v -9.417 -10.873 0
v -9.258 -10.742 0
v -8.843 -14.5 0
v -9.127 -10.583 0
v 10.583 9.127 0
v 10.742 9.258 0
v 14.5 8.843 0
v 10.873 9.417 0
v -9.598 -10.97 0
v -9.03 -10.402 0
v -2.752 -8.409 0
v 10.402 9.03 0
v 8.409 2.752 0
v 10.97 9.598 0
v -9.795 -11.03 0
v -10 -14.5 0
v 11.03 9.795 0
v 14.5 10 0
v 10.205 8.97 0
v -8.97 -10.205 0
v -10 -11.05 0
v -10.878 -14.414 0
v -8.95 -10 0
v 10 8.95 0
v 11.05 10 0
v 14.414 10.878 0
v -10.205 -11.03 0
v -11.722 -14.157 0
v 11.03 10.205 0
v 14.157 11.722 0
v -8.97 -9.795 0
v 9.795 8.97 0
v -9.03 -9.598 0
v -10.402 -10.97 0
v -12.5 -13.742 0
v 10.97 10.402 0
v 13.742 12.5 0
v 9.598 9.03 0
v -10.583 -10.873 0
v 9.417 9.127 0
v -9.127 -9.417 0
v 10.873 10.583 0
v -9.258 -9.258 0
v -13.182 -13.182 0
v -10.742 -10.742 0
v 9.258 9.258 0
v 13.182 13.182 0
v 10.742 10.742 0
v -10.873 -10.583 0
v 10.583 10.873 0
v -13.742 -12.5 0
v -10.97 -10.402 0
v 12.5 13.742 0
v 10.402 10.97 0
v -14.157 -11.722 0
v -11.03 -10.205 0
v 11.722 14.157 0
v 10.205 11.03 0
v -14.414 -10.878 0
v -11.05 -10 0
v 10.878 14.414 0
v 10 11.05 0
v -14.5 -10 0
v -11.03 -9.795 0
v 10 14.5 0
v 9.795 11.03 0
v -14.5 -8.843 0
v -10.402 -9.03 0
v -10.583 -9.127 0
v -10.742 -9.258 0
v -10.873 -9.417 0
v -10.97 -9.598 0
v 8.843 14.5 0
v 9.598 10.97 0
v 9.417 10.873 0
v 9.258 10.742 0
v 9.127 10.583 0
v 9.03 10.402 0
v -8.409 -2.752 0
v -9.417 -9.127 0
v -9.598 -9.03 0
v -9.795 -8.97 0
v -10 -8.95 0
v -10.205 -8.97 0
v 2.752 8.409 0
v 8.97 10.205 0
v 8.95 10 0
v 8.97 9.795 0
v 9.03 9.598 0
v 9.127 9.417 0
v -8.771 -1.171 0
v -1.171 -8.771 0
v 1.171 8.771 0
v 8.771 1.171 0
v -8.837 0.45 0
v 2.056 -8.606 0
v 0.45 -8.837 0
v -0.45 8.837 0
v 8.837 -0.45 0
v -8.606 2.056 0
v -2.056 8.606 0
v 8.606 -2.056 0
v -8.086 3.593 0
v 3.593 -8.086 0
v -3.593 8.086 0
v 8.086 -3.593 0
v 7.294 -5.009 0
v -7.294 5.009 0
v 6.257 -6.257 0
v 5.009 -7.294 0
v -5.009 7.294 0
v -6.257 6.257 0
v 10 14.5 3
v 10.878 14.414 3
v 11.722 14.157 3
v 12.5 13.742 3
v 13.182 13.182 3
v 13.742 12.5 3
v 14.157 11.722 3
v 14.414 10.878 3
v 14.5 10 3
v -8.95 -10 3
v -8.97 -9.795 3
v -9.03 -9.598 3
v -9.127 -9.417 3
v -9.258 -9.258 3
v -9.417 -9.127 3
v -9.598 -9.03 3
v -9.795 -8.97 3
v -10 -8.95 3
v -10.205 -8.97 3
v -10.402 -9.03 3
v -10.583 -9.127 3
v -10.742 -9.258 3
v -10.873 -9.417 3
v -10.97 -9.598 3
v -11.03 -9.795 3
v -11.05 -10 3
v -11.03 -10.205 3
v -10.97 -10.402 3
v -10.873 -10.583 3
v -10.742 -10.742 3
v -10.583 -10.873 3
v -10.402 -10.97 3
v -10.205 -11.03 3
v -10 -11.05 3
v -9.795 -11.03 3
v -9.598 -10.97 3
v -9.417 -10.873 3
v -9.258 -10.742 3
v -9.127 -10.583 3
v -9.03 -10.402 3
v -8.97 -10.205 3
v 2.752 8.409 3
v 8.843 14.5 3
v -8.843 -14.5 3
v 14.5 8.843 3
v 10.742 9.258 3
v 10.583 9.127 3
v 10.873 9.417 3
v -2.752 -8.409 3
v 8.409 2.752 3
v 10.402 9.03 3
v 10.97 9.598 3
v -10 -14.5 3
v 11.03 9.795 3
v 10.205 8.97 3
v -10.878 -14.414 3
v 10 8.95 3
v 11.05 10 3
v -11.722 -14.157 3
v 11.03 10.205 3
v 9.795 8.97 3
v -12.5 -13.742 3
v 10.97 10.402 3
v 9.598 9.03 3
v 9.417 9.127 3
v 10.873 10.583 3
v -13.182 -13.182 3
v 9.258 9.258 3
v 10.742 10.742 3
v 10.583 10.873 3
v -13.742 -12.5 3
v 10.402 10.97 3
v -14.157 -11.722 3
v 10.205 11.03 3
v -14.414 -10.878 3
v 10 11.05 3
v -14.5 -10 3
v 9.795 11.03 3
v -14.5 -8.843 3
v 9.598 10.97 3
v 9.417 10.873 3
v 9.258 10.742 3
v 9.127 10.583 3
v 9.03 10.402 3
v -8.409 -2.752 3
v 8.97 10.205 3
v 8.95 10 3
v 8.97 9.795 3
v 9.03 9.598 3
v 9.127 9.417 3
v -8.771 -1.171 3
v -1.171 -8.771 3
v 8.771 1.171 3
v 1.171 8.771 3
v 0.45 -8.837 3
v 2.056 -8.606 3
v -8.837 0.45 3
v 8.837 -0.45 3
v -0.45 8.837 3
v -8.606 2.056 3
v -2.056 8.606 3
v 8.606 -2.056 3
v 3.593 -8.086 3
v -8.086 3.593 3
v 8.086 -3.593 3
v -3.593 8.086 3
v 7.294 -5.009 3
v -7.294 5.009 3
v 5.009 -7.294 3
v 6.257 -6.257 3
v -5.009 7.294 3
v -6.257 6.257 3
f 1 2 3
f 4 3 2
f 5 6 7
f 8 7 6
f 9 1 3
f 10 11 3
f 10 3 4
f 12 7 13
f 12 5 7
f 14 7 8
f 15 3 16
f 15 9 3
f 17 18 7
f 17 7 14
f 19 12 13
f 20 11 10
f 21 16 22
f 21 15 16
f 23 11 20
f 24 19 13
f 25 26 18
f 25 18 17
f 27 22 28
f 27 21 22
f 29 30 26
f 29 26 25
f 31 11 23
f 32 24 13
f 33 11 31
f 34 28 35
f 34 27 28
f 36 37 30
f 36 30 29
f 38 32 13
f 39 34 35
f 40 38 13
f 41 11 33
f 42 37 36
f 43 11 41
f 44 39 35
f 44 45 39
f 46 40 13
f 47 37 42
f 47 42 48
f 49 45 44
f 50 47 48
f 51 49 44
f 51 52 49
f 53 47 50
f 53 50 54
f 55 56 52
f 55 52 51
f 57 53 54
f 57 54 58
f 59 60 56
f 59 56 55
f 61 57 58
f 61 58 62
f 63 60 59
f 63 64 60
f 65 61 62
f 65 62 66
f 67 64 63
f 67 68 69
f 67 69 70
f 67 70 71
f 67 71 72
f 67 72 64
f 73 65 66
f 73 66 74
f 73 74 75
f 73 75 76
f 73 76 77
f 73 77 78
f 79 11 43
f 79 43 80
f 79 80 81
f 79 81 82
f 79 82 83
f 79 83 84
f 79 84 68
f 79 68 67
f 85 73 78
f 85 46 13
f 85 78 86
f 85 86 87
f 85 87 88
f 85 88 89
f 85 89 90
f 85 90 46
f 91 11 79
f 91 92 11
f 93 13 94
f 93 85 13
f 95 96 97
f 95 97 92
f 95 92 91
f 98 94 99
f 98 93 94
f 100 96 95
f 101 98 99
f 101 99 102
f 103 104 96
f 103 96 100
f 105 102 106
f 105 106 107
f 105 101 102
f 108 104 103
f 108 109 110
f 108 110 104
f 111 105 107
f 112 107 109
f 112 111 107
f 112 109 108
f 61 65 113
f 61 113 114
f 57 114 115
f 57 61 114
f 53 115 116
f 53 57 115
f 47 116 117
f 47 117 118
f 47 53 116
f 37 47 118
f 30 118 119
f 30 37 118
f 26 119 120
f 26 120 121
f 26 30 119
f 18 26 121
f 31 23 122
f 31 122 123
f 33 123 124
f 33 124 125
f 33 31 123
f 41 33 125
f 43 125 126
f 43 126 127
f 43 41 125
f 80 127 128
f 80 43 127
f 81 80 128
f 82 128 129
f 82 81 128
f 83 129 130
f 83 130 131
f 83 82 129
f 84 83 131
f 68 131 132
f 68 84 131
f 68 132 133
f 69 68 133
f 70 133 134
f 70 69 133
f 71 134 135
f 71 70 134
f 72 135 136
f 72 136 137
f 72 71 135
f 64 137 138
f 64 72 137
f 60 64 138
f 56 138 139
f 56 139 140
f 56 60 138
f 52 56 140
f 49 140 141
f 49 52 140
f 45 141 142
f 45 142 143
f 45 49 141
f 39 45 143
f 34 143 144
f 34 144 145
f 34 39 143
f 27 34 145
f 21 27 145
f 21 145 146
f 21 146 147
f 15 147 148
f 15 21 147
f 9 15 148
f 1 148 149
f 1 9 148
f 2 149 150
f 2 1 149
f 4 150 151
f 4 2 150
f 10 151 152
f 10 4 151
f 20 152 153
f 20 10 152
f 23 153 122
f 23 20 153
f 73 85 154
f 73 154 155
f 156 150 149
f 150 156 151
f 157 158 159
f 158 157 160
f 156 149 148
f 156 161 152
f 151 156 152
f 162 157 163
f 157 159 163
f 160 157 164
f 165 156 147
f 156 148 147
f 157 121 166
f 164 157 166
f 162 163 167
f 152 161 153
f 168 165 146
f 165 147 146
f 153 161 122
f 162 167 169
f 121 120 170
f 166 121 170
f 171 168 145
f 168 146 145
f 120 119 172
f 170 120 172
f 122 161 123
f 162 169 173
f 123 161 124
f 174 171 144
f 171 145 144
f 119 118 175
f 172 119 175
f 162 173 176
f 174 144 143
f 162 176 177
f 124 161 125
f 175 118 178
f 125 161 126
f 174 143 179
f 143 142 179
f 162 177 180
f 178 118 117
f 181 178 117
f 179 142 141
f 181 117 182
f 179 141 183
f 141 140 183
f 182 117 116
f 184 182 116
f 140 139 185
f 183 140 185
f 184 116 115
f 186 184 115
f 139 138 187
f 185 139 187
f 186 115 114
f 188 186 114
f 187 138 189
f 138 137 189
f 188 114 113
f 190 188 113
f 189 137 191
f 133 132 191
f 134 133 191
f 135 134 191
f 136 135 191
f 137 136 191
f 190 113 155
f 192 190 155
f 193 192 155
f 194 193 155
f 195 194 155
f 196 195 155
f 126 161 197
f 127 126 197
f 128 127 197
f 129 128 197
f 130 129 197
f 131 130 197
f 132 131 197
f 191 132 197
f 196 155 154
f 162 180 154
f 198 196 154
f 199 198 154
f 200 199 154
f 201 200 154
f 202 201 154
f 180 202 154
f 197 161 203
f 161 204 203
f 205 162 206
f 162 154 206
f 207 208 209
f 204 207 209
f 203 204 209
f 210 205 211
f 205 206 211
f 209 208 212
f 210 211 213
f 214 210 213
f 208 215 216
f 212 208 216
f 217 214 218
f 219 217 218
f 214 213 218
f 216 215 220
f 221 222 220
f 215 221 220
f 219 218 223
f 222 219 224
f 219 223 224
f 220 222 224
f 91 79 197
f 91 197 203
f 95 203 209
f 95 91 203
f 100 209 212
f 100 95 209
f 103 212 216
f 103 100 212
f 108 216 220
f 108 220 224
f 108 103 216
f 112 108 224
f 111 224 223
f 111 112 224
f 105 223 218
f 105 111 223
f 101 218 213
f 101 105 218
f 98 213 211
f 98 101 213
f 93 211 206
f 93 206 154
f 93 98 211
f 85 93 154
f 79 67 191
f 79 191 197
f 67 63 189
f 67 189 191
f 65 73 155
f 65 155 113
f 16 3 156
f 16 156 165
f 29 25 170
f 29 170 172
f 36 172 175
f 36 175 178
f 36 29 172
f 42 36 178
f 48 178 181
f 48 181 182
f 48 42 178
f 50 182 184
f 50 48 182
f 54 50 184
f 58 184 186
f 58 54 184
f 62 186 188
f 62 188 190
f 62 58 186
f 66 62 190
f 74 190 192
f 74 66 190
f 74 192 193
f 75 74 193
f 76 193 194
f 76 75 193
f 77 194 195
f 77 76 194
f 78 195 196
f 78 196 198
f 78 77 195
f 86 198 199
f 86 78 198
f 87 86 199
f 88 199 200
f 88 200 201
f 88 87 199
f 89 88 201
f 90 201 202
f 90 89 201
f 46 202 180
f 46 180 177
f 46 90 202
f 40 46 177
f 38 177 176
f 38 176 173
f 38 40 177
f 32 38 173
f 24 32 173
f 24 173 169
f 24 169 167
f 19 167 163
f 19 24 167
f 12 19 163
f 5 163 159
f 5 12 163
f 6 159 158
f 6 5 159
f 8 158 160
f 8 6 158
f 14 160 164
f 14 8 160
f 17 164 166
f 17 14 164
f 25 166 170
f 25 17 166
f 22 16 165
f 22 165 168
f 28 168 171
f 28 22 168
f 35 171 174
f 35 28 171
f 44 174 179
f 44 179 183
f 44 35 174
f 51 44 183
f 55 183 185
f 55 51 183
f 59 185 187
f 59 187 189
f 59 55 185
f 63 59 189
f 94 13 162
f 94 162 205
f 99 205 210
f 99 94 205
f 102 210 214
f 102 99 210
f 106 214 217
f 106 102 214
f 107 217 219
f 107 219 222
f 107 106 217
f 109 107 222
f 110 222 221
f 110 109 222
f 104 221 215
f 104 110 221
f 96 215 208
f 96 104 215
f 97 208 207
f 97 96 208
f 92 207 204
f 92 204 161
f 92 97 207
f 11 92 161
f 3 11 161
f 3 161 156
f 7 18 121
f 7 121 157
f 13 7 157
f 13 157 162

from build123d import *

# Parameters (mm, degrees)
SKETCH1_R           = 1.05
BOSS_EXTRUDE1_DEPTH = 3


with BuildPart() as part:
    # Sketch1 → Boss-Extrude1 (new body)
    with BuildSketch(Plane.XY):
        with BuildLine():
            Line((2.752454122, 8.409308372), (8.843145751, 14.5))
            Line((8.843145751, 14.5), (10, 14.5))
            ThreePointArc((10, 14.5), (13.181980515, 13.181980515), (14.5, 10))
            Line((14.5, 10), (14.5, 8.843145751))
            Line((14.5, 8.843145751), (8.409308372, 2.752454122))
            ThreePointArc((8.409308372, 2.752454122), (6.256695253, -6.256695253), (-2.752454122, -8.409308372))
            Line((-2.752454122, -8.409308372), (-8.843145751, -14.5))
            Line((-8.843145751, -14.5), (-10, -14.5))
            ThreePointArc((-10, -14.5), (-13.181980515, -13.181980515), (-14.5, -10))
            Line((-14.5, -10), (-14.5, -8.843145751))
            Line((-14.5, -8.843145751), (-8.409308372, -2.752454122))
            ThreePointArc((-8.409308372, -2.752454122), (-6.256695253, 6.256695253), (2.752454122, 8.409308372))
        make_face()
        with Locations((10, 10)):
            Circle(SKETCH1_R, mode=Mode.SUBTRACT)
        with Locations((-10, -10)):
            Circle(SKETCH1_R, mode=Mode.SUBTRACT)
    extrude(amount=BOSS_EXTRUDE1_DEPTH)


solid = part.part
